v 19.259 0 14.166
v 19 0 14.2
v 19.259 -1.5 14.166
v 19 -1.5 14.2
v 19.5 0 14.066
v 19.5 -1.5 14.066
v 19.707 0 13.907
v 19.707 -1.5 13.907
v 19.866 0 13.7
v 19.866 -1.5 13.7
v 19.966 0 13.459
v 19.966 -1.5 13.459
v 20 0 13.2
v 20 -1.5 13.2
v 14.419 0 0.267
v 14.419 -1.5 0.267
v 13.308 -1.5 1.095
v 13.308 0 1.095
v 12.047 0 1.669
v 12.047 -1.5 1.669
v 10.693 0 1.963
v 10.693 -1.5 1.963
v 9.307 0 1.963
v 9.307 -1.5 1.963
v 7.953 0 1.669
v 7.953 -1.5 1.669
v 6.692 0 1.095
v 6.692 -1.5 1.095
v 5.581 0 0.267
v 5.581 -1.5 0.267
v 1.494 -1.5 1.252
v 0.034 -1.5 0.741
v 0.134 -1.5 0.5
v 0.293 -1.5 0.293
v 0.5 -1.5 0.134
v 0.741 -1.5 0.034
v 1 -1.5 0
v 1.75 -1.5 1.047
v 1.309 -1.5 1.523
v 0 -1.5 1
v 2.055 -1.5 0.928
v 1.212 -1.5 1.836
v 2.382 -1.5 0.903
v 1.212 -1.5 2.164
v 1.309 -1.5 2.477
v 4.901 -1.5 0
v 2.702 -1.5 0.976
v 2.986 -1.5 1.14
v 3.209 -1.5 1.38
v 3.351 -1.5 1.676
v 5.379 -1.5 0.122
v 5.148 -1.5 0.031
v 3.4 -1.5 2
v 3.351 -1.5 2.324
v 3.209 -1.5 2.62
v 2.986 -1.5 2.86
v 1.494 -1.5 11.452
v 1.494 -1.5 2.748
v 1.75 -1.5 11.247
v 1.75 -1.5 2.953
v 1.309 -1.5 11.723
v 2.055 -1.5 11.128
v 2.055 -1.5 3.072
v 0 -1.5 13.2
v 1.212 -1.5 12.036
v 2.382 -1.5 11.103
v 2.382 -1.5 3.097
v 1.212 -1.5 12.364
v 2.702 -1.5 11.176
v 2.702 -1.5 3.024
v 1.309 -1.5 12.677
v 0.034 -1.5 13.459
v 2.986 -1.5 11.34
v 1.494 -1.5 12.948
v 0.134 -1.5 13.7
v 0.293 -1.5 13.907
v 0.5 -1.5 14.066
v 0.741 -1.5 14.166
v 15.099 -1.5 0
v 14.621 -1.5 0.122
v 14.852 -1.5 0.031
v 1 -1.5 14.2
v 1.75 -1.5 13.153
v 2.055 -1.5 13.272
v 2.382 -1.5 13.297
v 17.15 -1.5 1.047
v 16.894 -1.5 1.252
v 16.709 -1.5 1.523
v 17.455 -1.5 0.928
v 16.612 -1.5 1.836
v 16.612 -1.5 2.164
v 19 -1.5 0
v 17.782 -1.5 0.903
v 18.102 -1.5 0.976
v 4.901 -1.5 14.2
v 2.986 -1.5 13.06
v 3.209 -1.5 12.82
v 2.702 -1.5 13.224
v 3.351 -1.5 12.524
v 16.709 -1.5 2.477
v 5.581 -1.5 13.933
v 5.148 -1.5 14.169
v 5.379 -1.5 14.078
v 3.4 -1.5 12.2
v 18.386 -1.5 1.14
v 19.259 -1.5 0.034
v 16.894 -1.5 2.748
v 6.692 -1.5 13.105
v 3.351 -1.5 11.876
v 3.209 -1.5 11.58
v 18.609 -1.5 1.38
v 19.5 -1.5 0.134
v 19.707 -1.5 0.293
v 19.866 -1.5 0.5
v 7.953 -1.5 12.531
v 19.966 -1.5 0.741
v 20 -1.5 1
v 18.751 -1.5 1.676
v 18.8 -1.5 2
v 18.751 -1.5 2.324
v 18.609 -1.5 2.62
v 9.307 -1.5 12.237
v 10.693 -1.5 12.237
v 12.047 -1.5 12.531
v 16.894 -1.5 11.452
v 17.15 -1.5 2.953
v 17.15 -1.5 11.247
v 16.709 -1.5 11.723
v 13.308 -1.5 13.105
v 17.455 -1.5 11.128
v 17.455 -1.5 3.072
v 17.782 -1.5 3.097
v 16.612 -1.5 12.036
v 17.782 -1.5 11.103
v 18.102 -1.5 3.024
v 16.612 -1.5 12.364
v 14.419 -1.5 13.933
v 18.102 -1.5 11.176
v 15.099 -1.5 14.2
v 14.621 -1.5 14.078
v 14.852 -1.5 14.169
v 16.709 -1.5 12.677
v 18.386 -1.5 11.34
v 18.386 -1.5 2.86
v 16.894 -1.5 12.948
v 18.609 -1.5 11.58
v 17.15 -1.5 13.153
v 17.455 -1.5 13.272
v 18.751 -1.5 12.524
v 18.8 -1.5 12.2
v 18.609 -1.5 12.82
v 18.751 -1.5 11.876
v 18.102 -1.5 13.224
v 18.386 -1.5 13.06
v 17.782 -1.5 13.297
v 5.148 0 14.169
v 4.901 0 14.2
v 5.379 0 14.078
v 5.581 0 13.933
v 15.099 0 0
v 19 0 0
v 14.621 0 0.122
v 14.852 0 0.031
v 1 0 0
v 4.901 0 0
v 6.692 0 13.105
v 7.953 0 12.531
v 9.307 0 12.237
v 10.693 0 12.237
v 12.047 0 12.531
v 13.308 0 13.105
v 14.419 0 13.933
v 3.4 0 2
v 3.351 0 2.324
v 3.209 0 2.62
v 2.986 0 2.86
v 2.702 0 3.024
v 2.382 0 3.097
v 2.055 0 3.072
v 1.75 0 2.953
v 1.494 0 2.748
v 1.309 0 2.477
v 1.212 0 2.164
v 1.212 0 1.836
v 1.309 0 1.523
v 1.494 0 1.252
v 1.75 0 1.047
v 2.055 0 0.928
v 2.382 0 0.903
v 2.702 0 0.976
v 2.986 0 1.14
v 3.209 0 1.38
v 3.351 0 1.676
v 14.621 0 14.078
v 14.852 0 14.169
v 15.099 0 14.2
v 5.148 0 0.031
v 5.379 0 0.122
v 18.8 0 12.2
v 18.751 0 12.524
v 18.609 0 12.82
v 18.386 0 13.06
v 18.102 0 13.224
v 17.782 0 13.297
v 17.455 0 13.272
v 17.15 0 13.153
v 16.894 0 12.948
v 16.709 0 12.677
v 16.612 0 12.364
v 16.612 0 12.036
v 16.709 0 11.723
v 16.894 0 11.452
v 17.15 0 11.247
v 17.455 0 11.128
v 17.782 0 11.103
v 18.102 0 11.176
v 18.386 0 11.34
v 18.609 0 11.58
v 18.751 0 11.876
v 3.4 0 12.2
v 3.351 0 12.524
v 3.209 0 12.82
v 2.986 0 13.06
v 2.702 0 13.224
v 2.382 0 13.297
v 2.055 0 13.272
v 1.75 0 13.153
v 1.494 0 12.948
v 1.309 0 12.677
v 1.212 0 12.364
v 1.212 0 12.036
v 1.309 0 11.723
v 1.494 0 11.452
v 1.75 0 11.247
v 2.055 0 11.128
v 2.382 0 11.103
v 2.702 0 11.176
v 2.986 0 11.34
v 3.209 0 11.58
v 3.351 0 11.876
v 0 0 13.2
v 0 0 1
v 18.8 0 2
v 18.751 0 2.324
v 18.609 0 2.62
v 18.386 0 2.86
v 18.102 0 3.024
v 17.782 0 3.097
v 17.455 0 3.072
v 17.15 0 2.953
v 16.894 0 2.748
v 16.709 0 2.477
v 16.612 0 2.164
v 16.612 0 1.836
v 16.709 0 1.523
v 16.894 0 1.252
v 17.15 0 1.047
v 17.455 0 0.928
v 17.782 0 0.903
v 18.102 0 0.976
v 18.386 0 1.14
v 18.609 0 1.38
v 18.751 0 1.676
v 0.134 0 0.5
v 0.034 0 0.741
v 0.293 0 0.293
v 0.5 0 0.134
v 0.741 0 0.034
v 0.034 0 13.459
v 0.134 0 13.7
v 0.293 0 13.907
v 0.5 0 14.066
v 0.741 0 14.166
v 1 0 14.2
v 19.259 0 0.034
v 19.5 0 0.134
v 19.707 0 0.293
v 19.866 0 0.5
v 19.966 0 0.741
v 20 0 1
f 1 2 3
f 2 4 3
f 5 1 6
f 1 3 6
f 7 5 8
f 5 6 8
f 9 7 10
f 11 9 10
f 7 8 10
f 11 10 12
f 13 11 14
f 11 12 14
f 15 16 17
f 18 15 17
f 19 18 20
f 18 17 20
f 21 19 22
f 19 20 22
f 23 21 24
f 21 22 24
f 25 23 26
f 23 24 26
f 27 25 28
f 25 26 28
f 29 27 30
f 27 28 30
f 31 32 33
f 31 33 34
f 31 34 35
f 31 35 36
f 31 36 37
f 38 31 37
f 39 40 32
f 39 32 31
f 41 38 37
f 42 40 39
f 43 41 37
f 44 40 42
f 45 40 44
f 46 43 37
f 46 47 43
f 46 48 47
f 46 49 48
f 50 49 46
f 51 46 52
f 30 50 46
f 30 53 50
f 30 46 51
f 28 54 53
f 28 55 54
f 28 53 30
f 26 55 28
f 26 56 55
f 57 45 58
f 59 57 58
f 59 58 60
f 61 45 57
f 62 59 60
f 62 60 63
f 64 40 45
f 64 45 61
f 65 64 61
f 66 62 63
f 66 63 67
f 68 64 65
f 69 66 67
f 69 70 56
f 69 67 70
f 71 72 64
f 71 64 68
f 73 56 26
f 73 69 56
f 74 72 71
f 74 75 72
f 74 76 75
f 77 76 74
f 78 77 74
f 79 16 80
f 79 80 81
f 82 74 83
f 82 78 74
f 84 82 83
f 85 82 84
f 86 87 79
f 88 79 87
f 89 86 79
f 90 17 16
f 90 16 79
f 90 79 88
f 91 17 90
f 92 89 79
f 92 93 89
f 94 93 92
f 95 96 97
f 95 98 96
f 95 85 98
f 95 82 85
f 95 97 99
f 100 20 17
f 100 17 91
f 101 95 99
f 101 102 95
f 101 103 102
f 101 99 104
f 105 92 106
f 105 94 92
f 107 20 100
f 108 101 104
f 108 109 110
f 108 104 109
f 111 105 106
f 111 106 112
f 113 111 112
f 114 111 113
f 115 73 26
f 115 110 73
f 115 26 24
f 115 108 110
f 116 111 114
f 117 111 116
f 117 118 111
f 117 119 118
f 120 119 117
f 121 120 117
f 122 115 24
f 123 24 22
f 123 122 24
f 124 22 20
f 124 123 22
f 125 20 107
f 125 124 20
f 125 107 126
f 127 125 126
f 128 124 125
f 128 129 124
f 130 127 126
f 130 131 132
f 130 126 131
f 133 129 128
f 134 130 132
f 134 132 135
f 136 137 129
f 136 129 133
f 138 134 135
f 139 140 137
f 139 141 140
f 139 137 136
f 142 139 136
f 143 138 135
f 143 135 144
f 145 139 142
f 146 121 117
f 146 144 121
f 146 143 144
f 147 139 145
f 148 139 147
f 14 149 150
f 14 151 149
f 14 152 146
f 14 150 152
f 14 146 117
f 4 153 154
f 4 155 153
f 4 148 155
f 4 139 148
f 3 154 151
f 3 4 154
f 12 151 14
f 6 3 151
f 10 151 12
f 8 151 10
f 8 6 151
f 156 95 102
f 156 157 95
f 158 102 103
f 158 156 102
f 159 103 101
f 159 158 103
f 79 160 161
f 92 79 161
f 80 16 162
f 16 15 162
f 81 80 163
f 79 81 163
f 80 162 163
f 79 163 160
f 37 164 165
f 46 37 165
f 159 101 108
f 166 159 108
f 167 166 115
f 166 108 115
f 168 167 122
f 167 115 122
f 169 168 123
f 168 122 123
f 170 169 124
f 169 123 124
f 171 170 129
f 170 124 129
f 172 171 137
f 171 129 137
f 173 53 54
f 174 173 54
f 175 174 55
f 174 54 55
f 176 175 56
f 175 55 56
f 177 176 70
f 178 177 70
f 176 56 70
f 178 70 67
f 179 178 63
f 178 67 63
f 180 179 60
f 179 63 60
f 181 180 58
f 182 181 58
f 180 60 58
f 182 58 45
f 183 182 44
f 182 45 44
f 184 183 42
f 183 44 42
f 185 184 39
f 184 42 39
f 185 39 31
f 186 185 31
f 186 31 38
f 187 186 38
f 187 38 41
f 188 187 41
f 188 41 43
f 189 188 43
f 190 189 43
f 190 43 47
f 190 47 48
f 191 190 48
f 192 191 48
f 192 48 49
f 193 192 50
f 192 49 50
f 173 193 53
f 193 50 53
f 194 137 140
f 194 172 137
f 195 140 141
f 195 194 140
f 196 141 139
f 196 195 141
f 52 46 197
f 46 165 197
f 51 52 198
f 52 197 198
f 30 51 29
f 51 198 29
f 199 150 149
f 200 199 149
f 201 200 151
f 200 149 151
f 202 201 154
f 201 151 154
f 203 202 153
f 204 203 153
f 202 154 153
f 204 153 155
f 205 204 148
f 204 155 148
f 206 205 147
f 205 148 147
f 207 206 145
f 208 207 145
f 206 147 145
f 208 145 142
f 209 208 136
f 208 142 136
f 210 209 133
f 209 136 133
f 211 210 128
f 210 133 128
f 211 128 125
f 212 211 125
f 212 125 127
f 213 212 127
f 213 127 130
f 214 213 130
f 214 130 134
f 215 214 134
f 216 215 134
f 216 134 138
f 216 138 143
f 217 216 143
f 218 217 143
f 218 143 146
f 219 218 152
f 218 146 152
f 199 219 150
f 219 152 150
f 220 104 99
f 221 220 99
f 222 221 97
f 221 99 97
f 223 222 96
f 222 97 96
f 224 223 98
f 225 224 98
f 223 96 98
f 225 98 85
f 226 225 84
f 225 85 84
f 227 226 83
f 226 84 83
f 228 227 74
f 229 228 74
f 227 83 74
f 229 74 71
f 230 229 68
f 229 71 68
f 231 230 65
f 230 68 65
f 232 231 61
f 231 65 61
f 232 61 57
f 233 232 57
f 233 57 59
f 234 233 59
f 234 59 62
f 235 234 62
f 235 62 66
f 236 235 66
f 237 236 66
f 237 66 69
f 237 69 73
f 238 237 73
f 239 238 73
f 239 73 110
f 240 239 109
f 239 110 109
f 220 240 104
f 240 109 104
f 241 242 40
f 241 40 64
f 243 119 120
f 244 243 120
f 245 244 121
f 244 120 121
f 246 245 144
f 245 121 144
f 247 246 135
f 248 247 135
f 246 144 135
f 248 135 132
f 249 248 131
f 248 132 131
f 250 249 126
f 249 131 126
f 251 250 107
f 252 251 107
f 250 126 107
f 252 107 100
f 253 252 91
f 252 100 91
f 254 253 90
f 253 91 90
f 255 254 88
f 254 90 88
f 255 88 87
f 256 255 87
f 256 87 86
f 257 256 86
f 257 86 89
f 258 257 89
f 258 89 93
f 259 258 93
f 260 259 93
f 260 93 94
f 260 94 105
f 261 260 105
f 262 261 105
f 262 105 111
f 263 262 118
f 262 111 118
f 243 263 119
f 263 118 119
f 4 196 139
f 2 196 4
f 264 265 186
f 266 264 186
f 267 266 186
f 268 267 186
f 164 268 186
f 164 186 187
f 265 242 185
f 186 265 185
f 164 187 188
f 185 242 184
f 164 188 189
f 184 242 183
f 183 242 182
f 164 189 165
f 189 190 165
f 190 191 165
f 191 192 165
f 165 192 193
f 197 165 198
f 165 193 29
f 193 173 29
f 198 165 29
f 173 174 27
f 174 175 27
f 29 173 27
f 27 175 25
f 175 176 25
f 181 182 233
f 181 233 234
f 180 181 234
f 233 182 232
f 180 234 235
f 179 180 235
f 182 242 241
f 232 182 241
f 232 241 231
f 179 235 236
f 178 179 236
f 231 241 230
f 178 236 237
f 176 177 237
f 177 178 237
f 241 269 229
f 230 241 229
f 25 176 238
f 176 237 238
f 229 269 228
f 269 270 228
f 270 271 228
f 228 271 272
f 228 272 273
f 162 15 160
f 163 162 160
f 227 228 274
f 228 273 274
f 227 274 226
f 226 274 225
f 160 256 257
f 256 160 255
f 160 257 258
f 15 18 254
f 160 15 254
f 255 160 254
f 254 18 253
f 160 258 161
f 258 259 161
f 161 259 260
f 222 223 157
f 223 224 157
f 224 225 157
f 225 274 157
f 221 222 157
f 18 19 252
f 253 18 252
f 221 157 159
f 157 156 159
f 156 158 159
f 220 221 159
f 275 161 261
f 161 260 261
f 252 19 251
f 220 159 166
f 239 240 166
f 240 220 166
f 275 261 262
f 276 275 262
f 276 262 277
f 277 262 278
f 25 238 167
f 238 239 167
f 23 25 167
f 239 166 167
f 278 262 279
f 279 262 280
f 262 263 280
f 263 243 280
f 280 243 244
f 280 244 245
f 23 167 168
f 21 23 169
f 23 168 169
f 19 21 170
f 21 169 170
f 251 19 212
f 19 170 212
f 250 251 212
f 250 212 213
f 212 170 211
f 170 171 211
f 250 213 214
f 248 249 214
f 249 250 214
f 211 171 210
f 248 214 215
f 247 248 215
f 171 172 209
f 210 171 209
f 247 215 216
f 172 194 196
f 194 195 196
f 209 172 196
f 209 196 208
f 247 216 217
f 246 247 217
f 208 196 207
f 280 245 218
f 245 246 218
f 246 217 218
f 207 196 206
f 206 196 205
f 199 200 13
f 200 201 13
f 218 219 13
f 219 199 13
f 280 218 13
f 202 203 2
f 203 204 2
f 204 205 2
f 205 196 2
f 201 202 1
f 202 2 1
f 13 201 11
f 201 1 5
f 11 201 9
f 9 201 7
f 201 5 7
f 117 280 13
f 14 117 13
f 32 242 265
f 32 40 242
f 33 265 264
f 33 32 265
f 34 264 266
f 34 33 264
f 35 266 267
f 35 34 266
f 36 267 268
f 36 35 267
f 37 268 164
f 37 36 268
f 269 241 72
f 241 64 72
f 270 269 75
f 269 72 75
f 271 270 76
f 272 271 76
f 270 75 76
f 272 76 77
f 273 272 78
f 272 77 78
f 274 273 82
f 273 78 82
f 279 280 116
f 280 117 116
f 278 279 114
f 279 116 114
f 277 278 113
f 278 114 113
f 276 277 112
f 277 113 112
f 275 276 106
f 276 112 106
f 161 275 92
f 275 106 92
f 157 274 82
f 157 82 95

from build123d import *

# Parameters (mm, degrees)
F0_W     = 20
F0_H     = 14.2
F1_DEPTH = 1.5
F2_R     = 1.1
F3_DEPTH = 1.5
F4_R     = 1


with BuildPart() as f1:
    # F0 (on Front) → F1 (new body)
    with BuildSketch(Plane.XZ):
        with Locations((10, 7.1)):
            Rectangle(F0_W, F0_H)
    extrude(amount=F1_DEPTH)

    # F2 (on face) → F3 (cut, through all)
    with BuildSketch(Plane.XZ.offset(1.5)):
        with Locations((2.3, 12.2)):
            Circle(F2_R)
        with Locations((17.7, 12.2)):
            Circle(F2_R)
        with Locations((2.3, 2)):
            Circle(F2_R)
        with Locations((17.7, 2)):
            Circle(F2_R)
        with BuildLine():
            Line((14.6904157598, 14.2), (5.3095842402, 14.2))
            ThreePointArc((5.3095842402, 14.2), (10, 12.2), (14.6904157598, 14.2))
        make_face()
        with BuildLine():
            ThreePointArc((14.6904157598, 0), (10, 2), (5.3095842402, 0))
            Line((5.3095842402, 0), (14.6904157598, 0))
        make_face()
    extrude(amount=-F3_DEPTH, mode=Mode.SUBTRACT)

    # F4
    f4_edges = [f1.edges().sort_by_distance(p)[0] for p in [
        (20, -0.75, 14.2),
        (20, -0.75, 0),
        (0, -0.75, 14.2),
        (0, -0.75, 0),
        (5.309584, -0.75, 14.2),
        (14.690416, -0.75, 14.2),
        (5.309584, -0.75, 0),
        (14.690416, -0.75, 0),
    ]]
    fillet(f4_edges, radius=F4_R)


solid = f1.part
